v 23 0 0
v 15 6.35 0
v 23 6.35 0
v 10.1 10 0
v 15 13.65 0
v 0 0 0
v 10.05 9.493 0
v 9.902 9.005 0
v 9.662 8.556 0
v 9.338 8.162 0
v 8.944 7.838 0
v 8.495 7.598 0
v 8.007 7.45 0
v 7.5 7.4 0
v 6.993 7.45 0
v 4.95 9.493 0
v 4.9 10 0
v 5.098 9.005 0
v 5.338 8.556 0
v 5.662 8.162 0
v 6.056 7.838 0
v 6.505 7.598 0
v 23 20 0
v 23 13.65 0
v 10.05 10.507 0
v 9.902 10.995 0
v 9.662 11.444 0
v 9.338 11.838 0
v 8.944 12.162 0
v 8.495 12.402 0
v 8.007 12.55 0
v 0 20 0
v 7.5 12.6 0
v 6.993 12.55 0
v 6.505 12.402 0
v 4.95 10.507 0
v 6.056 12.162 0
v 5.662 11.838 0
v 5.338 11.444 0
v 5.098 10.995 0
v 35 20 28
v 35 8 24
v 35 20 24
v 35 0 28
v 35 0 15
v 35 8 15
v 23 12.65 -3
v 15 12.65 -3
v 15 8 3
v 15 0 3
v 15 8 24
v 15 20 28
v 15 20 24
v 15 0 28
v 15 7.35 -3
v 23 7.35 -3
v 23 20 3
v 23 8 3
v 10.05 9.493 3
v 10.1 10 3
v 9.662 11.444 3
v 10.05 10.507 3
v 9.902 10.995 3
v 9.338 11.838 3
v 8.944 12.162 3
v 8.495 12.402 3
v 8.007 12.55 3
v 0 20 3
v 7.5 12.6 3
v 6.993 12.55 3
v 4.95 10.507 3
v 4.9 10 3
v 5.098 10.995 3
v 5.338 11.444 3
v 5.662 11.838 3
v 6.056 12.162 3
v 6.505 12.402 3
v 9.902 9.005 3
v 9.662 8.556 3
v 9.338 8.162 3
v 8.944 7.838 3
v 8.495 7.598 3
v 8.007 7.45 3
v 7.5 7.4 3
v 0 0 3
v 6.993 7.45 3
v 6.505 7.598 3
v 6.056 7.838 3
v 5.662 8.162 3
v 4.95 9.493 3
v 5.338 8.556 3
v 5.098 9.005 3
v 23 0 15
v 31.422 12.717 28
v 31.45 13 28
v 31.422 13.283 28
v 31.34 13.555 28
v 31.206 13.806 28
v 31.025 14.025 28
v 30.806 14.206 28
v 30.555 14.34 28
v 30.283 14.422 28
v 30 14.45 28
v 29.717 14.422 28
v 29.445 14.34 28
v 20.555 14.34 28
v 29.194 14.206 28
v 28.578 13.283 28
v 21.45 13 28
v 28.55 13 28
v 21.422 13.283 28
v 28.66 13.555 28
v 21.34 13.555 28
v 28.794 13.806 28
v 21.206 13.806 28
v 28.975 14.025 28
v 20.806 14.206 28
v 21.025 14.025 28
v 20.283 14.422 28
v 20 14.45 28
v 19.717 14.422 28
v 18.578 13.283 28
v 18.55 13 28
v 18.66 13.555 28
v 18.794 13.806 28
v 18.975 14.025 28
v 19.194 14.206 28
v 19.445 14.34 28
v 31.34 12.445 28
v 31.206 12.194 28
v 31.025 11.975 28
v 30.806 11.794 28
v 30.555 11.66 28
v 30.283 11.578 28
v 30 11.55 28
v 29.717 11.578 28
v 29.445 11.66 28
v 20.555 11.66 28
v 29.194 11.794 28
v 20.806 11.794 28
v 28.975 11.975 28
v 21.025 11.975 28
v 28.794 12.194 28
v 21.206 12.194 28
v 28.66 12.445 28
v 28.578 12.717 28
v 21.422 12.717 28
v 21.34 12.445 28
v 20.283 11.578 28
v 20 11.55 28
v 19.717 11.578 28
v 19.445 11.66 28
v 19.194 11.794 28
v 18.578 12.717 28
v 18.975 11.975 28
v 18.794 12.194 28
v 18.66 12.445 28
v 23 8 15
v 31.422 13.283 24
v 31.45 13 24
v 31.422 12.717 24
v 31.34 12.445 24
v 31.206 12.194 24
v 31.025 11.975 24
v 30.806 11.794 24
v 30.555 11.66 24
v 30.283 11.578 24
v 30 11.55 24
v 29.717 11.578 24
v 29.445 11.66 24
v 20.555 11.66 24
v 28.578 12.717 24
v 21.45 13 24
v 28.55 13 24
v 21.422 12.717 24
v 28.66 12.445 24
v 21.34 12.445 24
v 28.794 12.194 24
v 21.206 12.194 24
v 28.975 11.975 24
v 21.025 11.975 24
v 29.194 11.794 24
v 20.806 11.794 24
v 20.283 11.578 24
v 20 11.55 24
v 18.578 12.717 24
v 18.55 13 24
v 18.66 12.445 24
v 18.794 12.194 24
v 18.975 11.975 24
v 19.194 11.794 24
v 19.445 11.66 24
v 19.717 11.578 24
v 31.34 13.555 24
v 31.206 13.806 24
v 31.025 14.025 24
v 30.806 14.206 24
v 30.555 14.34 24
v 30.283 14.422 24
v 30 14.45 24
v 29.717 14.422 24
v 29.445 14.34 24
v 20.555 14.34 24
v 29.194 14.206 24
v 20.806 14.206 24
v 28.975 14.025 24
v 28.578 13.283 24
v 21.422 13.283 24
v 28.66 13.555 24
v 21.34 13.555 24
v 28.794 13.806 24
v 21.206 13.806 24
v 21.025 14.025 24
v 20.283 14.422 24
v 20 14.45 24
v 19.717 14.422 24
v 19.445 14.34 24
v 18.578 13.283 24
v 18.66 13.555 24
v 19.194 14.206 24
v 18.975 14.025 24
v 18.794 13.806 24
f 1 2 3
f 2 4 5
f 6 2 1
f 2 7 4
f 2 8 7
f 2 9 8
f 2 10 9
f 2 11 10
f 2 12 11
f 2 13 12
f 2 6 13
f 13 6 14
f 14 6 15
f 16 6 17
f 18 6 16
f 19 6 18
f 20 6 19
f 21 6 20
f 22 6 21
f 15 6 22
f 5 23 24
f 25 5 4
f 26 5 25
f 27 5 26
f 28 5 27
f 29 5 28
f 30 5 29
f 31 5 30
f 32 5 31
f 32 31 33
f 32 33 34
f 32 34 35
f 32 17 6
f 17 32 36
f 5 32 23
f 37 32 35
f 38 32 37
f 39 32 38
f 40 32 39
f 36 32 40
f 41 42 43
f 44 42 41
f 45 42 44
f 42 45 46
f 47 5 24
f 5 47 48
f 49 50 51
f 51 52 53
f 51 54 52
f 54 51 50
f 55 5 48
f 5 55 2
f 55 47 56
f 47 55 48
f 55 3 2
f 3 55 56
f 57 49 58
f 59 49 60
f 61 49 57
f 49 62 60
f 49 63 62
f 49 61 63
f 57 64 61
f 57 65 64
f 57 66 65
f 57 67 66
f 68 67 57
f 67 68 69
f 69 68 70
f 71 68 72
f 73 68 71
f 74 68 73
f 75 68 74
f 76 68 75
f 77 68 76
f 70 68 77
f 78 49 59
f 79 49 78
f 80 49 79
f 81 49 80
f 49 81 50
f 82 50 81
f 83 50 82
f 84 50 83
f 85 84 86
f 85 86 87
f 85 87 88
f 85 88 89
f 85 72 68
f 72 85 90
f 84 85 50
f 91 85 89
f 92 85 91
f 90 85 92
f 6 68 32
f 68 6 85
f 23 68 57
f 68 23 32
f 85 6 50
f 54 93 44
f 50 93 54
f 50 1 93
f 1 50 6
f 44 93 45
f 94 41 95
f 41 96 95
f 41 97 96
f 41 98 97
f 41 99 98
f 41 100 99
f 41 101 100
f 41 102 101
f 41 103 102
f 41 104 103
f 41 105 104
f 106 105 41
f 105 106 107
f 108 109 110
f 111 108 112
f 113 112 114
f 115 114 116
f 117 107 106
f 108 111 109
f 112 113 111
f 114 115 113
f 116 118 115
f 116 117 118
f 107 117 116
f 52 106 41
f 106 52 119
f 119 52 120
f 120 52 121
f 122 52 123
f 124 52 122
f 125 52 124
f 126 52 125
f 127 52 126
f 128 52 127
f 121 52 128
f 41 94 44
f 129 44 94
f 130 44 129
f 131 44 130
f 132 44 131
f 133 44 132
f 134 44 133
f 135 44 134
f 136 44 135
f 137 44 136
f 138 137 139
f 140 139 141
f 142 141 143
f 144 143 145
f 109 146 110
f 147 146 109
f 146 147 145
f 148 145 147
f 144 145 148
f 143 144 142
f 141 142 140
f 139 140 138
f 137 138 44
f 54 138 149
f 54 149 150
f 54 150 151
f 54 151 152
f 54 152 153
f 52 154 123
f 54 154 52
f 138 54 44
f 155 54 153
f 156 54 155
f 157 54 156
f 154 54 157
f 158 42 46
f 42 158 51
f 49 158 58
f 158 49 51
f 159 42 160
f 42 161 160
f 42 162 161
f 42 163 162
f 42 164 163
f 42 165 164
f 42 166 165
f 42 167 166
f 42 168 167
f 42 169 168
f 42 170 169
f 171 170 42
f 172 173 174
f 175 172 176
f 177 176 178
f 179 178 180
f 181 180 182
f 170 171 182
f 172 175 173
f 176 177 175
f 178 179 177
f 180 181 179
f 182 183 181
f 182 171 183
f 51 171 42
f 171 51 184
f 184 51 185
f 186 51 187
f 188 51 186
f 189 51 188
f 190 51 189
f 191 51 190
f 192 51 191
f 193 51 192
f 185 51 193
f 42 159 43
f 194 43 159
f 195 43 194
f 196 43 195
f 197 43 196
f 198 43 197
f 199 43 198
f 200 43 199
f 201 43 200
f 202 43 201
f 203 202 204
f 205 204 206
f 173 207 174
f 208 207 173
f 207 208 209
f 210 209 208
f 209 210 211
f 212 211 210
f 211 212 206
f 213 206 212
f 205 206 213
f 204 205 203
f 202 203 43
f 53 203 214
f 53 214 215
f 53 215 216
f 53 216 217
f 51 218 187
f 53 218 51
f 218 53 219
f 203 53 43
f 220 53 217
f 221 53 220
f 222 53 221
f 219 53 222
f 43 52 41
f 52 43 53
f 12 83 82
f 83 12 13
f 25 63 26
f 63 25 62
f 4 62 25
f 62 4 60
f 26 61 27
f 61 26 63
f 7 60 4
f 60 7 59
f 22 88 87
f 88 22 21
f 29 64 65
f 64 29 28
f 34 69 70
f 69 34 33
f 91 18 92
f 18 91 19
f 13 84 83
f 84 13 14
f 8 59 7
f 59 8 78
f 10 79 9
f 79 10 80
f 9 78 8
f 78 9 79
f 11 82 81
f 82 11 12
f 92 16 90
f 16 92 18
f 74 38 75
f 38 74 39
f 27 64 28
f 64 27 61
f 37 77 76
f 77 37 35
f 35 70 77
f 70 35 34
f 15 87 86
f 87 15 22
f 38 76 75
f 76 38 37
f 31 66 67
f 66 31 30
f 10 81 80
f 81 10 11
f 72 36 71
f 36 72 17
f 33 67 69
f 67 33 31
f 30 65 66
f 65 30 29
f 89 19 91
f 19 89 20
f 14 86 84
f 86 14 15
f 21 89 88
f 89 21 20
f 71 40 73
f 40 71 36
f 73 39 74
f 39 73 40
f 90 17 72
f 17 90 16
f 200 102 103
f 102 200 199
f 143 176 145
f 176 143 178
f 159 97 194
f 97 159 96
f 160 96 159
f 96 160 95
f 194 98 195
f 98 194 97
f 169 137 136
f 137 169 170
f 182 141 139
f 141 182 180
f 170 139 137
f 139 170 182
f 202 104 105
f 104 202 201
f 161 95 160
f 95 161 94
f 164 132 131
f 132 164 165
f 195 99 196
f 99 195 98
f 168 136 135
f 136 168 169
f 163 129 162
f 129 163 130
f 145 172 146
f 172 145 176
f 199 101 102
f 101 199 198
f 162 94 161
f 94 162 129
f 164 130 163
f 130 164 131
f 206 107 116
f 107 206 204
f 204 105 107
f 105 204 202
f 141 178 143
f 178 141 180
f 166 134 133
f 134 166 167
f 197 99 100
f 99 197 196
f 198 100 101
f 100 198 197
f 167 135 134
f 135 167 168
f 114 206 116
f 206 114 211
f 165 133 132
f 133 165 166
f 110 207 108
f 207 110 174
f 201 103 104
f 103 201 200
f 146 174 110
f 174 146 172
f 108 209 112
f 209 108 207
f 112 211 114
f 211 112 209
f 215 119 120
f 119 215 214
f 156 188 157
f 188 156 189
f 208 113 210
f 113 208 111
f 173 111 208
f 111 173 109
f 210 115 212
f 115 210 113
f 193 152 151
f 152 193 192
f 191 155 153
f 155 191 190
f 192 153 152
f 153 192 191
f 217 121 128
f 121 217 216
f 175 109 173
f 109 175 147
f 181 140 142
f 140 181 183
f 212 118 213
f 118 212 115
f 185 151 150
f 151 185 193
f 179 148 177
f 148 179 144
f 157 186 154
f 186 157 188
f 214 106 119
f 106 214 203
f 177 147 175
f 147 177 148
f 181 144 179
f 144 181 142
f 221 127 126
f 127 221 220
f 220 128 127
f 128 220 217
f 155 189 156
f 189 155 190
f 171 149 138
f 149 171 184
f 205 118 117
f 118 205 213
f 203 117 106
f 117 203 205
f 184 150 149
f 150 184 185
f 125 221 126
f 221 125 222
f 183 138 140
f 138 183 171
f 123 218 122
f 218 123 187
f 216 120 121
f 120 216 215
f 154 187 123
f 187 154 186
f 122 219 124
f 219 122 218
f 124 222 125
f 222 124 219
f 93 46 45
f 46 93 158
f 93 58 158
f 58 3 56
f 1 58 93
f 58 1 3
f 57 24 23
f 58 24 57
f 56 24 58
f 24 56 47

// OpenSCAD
//customisation alfawise c10 - axe Y (plateau) nouvelle pièce pour intégrer la fixation d'une fin ou début de course
echo(version=version());

epsilon=0.1;
larg_rail=20;
longueur=35;
hauteur=28;//penser à retirer la hauteur de l'interrupteur+vis qui doit passer sous le plateau
haut_fixation=3;
long_encoche=12;
haut_encoche=15;
larg_axe=8;
diam_fixation=5;
haut_fix_inter=4;
trapeze_min=5.3;
trapeze_max=7.3;
haut_trapeze=3;
pas_fix_inter=5;//un pas depuis le bord, deux pas entre les deux trous et un autre pas jusqu'à l'autre bord
diam_fix_inter=2.7;
shift_inter=7;
long_fixation=longueur-4*pas_fix_inter;

module prism(l, w, h){
    polyhedron(
    points=[[0,0,0], [l,0,0], [l,w,0], [0,w,0], [0,w,h], [l,w,h]],
    faces=[[0,1,2,3],[5,4,3,2],[0,4,5,1],[0,3,4],[5,2,1]]
    );
}

difference(){
    //pièce de base
    union(){
        //fixation sur rail
        cube([longueur,larg_rail,haut_fixation],0);
        //connexion verticale
        translate([long_fixation,0,0]){
            cube([longueur-long_fixation,larg_axe,hauteur],0);
        }
        //platine inter
        translate([long_fixation,0,hauteur-haut_fix_inter]){
            cube([longueur-long_fixation,larg_rail,haut_fix_inter],0);
        }
        //(trapèze) encoche d'alignement dans le rail (attention, coordonnées négatives, bien vérifier en imprimant)
        union(){
            translate([long_fixation,(trapeze_max-trapeze_min)/2+(larg_rail+trapeze_min)/2,0]){
                prism(longueur-long_fixation,-(trapeze_max-trapeze_min)/2,-haut_trapeze);
            }
            translate([long_fixation,(larg_rail-trapeze_min)/2,-haut_trapeze]){
                cube([longueur-long_fixation,trapeze_min,haut_trapeze],0);
            }
            translate([longueur,(larg_rail-trapeze_min)/2-(trapeze_max-trapeze_min)/2,0]){
                rotate([0,0,180]){
                    prism(longueur-long_fixation,-(trapeze_max-trapeze_min)/2,-haut_trapeze);
                }
            }
        }
    }
    //retraits
    union(){
        //vis fixation
        translate([long_fixation/2,larg_rail/2,-epsilon]){
            cylinder(haut_fixation+2*epsilon,(diam_fixation/2)+epsilon,(diam_fixation/2)+epsilon,$fn=32);
        }
        //2x vis inter
        translate([longueur-pas_fix_inter,larg_rail-shift_inter,hauteur-haut_fix_inter-epsilon]){
            cylinder(haut_fix_inter+2*epsilon,(diam_fix_inter/2)+epsilon,(diam_fix_inter/2)+epsilon,$fn=32);
        }
        translate([longueur-3*pas_fix_inter,larg_rail-shift_inter,hauteur-haut_fix_inter-epsilon]){
            cylinder(haut_fix_inter+2*epsilon,(diam_fix_inter/2)+epsilon,(diam_fix_inter/2)+epsilon,$fn=32);
        }
        //encoche
        translate([longueur-long_encoche,-epsilon,-haut_trapeze-epsilon]){
            cube([long_encoche+epsilon,larg_rail+2*epsilon,haut_encoche+haut_trapeze+epsilon],0);
        }
    }
}
